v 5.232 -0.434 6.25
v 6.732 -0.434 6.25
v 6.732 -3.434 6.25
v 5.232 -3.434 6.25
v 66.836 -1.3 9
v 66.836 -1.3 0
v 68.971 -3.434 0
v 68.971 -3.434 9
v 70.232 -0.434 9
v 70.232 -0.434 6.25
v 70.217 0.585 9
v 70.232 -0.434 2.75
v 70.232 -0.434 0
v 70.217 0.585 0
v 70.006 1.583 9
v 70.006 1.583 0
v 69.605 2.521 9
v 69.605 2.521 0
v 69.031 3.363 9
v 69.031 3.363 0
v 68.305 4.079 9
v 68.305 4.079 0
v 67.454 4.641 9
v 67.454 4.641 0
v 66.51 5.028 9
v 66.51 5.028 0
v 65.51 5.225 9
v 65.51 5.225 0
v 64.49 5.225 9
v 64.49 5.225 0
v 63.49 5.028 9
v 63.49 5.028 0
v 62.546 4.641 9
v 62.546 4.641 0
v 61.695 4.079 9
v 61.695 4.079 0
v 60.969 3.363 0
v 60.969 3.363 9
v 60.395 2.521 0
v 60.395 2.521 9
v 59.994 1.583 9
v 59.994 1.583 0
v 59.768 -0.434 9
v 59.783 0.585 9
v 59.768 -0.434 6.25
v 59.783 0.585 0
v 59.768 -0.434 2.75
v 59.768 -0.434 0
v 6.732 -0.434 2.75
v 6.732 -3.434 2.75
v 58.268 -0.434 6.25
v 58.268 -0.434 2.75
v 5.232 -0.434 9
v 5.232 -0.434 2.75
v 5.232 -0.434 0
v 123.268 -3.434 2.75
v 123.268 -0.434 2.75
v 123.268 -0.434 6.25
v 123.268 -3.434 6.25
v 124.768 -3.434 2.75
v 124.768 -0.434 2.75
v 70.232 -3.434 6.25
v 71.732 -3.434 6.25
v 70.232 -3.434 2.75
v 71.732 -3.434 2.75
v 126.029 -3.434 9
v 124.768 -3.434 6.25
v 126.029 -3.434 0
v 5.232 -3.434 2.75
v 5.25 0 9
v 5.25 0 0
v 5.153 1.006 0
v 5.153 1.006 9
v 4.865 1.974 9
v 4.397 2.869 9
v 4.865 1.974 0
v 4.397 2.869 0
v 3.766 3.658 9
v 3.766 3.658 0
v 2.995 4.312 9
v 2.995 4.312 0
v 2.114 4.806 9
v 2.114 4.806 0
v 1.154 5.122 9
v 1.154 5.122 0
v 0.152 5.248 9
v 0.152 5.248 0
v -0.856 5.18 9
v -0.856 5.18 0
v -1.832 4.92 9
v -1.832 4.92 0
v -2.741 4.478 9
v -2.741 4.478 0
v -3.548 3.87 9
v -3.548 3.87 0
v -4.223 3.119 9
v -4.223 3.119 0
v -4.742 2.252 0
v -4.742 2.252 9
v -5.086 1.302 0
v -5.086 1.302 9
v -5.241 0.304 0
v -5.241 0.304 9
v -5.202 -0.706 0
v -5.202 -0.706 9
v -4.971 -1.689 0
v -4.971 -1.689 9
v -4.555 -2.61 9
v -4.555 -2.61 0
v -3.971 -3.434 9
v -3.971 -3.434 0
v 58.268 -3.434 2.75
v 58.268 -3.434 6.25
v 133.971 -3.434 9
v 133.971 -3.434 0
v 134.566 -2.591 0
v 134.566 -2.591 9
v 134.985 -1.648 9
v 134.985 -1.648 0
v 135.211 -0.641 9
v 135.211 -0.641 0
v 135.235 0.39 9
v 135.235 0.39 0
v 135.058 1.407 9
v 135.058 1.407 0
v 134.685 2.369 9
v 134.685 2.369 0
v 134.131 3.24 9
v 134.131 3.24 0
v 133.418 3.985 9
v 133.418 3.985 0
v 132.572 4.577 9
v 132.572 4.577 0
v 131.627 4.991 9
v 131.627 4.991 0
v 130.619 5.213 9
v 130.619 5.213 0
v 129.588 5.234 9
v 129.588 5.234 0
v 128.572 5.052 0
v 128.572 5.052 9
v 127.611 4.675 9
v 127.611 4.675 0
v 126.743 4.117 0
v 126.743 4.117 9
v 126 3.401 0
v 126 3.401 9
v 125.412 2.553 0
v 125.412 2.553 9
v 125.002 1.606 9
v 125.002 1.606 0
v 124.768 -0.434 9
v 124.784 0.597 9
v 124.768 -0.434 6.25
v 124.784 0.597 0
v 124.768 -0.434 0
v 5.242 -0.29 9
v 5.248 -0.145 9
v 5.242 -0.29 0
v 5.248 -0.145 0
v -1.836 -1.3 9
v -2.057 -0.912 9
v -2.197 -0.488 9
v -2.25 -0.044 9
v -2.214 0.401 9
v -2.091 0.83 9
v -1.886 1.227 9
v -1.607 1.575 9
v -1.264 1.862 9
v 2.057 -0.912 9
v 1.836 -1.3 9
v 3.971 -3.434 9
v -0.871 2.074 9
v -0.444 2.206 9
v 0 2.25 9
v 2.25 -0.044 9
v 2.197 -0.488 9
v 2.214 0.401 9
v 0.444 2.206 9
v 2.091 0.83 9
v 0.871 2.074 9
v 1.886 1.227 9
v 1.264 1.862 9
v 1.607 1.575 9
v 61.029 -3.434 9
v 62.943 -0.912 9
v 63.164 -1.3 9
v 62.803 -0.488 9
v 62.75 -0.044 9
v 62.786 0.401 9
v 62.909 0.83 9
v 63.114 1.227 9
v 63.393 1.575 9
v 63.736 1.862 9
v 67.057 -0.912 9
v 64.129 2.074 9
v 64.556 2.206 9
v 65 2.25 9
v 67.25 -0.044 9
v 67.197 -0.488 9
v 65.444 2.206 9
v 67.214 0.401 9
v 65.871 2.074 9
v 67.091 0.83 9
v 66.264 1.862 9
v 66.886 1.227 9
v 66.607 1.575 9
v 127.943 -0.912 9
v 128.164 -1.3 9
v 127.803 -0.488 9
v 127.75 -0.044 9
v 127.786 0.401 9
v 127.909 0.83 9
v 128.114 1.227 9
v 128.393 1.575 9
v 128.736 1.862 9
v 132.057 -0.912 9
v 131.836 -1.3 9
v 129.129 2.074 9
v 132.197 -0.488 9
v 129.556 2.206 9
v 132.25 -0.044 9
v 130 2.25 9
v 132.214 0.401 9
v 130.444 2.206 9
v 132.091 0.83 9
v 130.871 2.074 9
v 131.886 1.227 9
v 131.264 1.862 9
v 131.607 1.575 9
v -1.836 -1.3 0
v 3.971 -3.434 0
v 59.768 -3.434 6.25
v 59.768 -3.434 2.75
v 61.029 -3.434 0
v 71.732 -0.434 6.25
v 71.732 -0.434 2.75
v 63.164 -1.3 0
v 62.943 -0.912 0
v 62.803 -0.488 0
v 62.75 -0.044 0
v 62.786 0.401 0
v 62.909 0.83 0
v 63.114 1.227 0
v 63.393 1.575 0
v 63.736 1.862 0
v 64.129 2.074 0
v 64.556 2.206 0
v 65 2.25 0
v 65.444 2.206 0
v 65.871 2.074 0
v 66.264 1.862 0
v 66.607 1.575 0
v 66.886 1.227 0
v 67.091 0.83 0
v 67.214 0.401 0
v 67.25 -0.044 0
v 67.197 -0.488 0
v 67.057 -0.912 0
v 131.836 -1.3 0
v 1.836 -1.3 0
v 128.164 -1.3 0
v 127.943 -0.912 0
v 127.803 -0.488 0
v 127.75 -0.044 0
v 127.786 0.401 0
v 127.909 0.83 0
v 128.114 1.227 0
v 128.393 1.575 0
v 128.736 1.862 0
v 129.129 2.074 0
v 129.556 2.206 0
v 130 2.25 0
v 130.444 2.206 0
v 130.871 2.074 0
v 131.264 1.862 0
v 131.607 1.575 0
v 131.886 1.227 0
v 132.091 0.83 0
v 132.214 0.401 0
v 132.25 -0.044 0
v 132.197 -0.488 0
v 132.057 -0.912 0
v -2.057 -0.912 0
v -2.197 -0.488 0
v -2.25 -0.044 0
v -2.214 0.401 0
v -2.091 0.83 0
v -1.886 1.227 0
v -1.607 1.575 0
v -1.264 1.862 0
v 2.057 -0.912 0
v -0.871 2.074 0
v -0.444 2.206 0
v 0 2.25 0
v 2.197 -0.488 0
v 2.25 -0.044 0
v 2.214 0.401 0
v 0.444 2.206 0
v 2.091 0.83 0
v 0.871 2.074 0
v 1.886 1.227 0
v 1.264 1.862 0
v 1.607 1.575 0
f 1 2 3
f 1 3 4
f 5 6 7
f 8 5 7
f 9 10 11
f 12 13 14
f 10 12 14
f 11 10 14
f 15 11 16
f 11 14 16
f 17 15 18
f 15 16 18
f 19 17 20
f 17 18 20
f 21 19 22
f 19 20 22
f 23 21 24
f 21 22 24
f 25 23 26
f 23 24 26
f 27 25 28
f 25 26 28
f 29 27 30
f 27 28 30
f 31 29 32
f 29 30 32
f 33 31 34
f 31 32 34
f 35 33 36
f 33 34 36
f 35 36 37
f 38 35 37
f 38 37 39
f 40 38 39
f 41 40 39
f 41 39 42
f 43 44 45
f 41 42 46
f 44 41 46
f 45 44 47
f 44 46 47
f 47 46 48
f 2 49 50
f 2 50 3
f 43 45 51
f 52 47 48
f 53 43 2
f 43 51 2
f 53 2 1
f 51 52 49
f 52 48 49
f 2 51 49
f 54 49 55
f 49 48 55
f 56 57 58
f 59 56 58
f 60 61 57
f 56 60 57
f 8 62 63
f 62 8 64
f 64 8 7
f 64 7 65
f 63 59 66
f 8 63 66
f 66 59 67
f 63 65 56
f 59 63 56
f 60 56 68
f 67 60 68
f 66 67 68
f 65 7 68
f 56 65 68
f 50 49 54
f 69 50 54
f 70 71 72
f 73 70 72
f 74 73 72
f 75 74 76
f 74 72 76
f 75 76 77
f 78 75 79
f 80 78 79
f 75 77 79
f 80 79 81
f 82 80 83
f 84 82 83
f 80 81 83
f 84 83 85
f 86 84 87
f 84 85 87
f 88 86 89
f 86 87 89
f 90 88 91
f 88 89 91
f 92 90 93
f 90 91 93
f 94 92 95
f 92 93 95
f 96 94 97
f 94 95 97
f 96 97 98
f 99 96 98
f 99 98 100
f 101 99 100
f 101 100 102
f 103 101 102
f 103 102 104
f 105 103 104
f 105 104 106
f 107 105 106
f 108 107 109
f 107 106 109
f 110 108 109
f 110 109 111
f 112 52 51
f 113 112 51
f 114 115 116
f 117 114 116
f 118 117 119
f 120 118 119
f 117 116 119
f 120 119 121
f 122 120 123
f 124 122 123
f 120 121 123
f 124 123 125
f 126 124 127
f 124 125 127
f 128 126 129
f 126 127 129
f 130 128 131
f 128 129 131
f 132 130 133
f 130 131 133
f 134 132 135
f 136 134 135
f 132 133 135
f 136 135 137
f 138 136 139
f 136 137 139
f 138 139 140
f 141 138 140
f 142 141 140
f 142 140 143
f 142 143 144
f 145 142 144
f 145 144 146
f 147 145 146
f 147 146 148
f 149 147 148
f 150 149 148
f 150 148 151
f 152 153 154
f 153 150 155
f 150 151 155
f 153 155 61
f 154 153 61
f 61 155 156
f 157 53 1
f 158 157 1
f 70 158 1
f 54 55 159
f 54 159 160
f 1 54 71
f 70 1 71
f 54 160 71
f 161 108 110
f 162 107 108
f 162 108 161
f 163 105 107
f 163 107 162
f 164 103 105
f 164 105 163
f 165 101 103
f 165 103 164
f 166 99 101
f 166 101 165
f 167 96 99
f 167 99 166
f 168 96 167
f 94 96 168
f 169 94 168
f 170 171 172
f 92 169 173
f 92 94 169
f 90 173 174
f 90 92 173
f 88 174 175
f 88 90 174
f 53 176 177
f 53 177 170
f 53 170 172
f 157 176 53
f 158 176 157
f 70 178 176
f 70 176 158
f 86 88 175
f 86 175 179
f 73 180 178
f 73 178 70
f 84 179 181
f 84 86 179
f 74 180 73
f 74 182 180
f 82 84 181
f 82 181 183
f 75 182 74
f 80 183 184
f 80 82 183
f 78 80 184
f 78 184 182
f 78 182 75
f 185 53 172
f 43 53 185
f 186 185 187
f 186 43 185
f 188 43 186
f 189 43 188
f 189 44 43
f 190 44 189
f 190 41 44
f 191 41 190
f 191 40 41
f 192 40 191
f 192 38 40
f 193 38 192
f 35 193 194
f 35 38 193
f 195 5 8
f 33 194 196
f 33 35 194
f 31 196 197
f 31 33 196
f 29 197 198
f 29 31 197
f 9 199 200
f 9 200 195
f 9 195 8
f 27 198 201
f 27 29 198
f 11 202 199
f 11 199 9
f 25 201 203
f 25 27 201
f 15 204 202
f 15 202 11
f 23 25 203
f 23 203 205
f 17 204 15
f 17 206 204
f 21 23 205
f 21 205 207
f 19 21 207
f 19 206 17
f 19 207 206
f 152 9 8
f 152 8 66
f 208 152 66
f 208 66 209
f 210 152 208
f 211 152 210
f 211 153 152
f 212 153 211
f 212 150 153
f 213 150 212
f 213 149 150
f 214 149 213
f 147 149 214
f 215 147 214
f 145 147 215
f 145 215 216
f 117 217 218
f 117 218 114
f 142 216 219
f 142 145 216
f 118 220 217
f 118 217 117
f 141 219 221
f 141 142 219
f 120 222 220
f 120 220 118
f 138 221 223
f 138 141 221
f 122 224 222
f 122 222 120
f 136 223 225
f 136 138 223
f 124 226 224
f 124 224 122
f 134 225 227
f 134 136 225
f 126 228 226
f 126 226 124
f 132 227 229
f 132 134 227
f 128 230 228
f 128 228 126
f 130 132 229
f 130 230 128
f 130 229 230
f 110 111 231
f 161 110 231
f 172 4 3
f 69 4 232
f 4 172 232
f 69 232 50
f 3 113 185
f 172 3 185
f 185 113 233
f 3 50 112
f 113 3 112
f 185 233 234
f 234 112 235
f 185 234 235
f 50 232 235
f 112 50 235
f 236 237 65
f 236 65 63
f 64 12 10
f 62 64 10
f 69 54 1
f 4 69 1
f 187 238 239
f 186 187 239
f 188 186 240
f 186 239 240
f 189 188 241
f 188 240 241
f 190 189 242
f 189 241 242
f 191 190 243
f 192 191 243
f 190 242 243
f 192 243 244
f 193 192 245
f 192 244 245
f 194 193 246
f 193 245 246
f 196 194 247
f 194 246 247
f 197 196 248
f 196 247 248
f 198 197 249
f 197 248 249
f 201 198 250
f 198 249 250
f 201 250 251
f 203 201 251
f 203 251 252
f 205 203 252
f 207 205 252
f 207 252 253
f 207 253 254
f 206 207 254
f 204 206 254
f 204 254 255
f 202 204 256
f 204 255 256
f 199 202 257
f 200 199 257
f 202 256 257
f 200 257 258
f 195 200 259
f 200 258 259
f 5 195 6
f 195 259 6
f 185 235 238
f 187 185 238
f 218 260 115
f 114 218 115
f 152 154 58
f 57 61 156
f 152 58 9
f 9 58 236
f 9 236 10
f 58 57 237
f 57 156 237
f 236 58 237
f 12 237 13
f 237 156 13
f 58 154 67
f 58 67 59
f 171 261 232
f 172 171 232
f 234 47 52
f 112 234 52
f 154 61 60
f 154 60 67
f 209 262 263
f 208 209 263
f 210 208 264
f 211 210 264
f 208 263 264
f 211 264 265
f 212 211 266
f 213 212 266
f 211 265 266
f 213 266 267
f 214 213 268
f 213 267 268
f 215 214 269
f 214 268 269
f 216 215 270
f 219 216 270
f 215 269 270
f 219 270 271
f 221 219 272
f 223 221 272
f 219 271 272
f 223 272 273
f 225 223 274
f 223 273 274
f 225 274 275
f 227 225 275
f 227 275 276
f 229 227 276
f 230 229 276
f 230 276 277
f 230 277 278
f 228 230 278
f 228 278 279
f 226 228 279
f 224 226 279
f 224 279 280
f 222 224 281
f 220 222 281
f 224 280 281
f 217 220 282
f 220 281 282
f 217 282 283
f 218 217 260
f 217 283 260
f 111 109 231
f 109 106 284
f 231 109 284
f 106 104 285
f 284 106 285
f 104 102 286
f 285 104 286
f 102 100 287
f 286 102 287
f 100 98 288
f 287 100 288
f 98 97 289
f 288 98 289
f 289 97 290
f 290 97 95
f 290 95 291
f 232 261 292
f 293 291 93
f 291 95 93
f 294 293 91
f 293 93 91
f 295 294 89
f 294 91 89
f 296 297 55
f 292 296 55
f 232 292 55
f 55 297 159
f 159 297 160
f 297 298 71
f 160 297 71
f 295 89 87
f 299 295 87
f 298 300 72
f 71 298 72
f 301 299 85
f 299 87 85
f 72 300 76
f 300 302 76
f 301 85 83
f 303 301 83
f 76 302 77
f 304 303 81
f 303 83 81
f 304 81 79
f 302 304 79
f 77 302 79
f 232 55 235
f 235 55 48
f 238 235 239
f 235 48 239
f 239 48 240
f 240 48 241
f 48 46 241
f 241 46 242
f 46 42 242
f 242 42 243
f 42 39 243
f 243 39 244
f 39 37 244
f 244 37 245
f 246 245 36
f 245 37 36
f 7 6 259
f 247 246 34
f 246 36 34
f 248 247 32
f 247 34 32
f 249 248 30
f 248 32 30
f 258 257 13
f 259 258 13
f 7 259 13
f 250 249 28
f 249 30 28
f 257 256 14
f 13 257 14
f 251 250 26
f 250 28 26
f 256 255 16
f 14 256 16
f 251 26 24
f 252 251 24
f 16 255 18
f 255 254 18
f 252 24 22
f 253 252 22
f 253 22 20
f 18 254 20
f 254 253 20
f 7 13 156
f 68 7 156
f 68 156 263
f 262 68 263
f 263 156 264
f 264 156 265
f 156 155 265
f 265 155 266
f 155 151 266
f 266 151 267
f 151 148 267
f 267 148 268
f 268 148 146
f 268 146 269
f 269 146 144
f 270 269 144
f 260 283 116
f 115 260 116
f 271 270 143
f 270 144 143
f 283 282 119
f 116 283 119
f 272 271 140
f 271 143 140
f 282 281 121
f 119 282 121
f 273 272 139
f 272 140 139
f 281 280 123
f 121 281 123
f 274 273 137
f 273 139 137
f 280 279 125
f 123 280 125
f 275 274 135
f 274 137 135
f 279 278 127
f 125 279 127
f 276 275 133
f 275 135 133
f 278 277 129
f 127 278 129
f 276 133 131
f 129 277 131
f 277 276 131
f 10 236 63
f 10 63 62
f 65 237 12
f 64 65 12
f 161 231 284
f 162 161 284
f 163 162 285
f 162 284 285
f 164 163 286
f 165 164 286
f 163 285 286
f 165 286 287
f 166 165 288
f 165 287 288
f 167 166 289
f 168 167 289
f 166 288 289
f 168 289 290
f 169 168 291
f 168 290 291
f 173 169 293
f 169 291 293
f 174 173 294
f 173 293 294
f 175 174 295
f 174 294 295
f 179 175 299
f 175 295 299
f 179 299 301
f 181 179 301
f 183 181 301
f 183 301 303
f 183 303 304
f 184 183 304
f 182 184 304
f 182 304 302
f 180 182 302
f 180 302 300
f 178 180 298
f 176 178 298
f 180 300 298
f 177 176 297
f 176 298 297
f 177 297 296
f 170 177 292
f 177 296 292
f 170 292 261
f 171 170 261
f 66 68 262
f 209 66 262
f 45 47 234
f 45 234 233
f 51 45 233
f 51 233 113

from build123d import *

# Parameters (mm, degrees)
F1_DEPTH = 9
F2_W     = 1.5
F2_H     = 3.5
F3_DEPTH = 3


with BuildPart() as f1:
    # F0 (on Top) → F1 (new body)
    with BuildSketch(Plane.XY):
        with BuildLine():
            ThreePointArc((5.231998, -0.43439), (4.839731, -2.034577), (3.970827, -3.43439))
            Line((3.970827, -3.43439), (61.029173, -3.43439))
            Line((61.029173, -3.43439), (63.163563, -1.3))
            ThreePointArc((63.163563, -1.3), (65, 2.25), (66.836437, -1.3))
            Line((66.836437, -1.3), (68.970827, -3.43439))
            Line((68.970827, -3.43439), (126.029173, -3.43439))
            Line((126.029173, -3.43439), (128.163563, -1.3))
            ThreePointArc((128.163563, -1.3), (130, 2.25), (131.836437, -1.3))
            Line((131.836437, -1.3), (133.970827, -3.43439))
            ThreePointArc((133.970827, -3.43439), (131.627157, 4.991479), (124.768002, -0.43439))
            Line((124.768002, -0.43439), (70.231998, -0.43439))
            ThreePointArc((70.231998, -0.43439), (65, 5.25), (59.768002, -0.43439))
            Line((59.768002, -0.43439), (5.231998, -0.43439))
        make_face()
        with BuildLine():
            ThreePointArc((-1.836437, -1.3), (0, 2.25), (1.836437, -1.3))
            Line((1.836437, -1.3), (3.970827, -3.43439))
            ThreePointArc((3.970827, -3.43439), (4.839731, -2.034577), (5.231998, -0.43439))
            ThreePointArc((5.231998, -0.43439), (5.245498, -0.217381), (5.25, 0))
            ThreePointArc((5.25, 0), (-1.832438, 4.919824), (-3.970827, -3.43439))
            Line((-3.970827, -3.43439), (-1.836437, -1.3))
        make_face()
    extrude(amount=F1_DEPTH)

    # F2 (on face) → F3 (cut, through all)
    with BuildSketch(Plane(origin=(0, -0.43439, 0), x_dir=(-1, 0, 0), z_dir=(0, 1, 0))):
        with Locations((-59.018002, 4.5)):
            Rectangle(F2_W, F2_H)
        with Locations((-70.981998, 4.5)):
            Rectangle(F2_W, F2_H)
        with Locations((-5.981998, 4.5)):
            Rectangle(F2_W, F2_H)
        with Locations((-124.018002, 4.5)):
            Rectangle(F2_W, F2_H)
    extrude(amount=-F3_DEPTH, mode=Mode.SUBTRACT)


solid = f1.part
